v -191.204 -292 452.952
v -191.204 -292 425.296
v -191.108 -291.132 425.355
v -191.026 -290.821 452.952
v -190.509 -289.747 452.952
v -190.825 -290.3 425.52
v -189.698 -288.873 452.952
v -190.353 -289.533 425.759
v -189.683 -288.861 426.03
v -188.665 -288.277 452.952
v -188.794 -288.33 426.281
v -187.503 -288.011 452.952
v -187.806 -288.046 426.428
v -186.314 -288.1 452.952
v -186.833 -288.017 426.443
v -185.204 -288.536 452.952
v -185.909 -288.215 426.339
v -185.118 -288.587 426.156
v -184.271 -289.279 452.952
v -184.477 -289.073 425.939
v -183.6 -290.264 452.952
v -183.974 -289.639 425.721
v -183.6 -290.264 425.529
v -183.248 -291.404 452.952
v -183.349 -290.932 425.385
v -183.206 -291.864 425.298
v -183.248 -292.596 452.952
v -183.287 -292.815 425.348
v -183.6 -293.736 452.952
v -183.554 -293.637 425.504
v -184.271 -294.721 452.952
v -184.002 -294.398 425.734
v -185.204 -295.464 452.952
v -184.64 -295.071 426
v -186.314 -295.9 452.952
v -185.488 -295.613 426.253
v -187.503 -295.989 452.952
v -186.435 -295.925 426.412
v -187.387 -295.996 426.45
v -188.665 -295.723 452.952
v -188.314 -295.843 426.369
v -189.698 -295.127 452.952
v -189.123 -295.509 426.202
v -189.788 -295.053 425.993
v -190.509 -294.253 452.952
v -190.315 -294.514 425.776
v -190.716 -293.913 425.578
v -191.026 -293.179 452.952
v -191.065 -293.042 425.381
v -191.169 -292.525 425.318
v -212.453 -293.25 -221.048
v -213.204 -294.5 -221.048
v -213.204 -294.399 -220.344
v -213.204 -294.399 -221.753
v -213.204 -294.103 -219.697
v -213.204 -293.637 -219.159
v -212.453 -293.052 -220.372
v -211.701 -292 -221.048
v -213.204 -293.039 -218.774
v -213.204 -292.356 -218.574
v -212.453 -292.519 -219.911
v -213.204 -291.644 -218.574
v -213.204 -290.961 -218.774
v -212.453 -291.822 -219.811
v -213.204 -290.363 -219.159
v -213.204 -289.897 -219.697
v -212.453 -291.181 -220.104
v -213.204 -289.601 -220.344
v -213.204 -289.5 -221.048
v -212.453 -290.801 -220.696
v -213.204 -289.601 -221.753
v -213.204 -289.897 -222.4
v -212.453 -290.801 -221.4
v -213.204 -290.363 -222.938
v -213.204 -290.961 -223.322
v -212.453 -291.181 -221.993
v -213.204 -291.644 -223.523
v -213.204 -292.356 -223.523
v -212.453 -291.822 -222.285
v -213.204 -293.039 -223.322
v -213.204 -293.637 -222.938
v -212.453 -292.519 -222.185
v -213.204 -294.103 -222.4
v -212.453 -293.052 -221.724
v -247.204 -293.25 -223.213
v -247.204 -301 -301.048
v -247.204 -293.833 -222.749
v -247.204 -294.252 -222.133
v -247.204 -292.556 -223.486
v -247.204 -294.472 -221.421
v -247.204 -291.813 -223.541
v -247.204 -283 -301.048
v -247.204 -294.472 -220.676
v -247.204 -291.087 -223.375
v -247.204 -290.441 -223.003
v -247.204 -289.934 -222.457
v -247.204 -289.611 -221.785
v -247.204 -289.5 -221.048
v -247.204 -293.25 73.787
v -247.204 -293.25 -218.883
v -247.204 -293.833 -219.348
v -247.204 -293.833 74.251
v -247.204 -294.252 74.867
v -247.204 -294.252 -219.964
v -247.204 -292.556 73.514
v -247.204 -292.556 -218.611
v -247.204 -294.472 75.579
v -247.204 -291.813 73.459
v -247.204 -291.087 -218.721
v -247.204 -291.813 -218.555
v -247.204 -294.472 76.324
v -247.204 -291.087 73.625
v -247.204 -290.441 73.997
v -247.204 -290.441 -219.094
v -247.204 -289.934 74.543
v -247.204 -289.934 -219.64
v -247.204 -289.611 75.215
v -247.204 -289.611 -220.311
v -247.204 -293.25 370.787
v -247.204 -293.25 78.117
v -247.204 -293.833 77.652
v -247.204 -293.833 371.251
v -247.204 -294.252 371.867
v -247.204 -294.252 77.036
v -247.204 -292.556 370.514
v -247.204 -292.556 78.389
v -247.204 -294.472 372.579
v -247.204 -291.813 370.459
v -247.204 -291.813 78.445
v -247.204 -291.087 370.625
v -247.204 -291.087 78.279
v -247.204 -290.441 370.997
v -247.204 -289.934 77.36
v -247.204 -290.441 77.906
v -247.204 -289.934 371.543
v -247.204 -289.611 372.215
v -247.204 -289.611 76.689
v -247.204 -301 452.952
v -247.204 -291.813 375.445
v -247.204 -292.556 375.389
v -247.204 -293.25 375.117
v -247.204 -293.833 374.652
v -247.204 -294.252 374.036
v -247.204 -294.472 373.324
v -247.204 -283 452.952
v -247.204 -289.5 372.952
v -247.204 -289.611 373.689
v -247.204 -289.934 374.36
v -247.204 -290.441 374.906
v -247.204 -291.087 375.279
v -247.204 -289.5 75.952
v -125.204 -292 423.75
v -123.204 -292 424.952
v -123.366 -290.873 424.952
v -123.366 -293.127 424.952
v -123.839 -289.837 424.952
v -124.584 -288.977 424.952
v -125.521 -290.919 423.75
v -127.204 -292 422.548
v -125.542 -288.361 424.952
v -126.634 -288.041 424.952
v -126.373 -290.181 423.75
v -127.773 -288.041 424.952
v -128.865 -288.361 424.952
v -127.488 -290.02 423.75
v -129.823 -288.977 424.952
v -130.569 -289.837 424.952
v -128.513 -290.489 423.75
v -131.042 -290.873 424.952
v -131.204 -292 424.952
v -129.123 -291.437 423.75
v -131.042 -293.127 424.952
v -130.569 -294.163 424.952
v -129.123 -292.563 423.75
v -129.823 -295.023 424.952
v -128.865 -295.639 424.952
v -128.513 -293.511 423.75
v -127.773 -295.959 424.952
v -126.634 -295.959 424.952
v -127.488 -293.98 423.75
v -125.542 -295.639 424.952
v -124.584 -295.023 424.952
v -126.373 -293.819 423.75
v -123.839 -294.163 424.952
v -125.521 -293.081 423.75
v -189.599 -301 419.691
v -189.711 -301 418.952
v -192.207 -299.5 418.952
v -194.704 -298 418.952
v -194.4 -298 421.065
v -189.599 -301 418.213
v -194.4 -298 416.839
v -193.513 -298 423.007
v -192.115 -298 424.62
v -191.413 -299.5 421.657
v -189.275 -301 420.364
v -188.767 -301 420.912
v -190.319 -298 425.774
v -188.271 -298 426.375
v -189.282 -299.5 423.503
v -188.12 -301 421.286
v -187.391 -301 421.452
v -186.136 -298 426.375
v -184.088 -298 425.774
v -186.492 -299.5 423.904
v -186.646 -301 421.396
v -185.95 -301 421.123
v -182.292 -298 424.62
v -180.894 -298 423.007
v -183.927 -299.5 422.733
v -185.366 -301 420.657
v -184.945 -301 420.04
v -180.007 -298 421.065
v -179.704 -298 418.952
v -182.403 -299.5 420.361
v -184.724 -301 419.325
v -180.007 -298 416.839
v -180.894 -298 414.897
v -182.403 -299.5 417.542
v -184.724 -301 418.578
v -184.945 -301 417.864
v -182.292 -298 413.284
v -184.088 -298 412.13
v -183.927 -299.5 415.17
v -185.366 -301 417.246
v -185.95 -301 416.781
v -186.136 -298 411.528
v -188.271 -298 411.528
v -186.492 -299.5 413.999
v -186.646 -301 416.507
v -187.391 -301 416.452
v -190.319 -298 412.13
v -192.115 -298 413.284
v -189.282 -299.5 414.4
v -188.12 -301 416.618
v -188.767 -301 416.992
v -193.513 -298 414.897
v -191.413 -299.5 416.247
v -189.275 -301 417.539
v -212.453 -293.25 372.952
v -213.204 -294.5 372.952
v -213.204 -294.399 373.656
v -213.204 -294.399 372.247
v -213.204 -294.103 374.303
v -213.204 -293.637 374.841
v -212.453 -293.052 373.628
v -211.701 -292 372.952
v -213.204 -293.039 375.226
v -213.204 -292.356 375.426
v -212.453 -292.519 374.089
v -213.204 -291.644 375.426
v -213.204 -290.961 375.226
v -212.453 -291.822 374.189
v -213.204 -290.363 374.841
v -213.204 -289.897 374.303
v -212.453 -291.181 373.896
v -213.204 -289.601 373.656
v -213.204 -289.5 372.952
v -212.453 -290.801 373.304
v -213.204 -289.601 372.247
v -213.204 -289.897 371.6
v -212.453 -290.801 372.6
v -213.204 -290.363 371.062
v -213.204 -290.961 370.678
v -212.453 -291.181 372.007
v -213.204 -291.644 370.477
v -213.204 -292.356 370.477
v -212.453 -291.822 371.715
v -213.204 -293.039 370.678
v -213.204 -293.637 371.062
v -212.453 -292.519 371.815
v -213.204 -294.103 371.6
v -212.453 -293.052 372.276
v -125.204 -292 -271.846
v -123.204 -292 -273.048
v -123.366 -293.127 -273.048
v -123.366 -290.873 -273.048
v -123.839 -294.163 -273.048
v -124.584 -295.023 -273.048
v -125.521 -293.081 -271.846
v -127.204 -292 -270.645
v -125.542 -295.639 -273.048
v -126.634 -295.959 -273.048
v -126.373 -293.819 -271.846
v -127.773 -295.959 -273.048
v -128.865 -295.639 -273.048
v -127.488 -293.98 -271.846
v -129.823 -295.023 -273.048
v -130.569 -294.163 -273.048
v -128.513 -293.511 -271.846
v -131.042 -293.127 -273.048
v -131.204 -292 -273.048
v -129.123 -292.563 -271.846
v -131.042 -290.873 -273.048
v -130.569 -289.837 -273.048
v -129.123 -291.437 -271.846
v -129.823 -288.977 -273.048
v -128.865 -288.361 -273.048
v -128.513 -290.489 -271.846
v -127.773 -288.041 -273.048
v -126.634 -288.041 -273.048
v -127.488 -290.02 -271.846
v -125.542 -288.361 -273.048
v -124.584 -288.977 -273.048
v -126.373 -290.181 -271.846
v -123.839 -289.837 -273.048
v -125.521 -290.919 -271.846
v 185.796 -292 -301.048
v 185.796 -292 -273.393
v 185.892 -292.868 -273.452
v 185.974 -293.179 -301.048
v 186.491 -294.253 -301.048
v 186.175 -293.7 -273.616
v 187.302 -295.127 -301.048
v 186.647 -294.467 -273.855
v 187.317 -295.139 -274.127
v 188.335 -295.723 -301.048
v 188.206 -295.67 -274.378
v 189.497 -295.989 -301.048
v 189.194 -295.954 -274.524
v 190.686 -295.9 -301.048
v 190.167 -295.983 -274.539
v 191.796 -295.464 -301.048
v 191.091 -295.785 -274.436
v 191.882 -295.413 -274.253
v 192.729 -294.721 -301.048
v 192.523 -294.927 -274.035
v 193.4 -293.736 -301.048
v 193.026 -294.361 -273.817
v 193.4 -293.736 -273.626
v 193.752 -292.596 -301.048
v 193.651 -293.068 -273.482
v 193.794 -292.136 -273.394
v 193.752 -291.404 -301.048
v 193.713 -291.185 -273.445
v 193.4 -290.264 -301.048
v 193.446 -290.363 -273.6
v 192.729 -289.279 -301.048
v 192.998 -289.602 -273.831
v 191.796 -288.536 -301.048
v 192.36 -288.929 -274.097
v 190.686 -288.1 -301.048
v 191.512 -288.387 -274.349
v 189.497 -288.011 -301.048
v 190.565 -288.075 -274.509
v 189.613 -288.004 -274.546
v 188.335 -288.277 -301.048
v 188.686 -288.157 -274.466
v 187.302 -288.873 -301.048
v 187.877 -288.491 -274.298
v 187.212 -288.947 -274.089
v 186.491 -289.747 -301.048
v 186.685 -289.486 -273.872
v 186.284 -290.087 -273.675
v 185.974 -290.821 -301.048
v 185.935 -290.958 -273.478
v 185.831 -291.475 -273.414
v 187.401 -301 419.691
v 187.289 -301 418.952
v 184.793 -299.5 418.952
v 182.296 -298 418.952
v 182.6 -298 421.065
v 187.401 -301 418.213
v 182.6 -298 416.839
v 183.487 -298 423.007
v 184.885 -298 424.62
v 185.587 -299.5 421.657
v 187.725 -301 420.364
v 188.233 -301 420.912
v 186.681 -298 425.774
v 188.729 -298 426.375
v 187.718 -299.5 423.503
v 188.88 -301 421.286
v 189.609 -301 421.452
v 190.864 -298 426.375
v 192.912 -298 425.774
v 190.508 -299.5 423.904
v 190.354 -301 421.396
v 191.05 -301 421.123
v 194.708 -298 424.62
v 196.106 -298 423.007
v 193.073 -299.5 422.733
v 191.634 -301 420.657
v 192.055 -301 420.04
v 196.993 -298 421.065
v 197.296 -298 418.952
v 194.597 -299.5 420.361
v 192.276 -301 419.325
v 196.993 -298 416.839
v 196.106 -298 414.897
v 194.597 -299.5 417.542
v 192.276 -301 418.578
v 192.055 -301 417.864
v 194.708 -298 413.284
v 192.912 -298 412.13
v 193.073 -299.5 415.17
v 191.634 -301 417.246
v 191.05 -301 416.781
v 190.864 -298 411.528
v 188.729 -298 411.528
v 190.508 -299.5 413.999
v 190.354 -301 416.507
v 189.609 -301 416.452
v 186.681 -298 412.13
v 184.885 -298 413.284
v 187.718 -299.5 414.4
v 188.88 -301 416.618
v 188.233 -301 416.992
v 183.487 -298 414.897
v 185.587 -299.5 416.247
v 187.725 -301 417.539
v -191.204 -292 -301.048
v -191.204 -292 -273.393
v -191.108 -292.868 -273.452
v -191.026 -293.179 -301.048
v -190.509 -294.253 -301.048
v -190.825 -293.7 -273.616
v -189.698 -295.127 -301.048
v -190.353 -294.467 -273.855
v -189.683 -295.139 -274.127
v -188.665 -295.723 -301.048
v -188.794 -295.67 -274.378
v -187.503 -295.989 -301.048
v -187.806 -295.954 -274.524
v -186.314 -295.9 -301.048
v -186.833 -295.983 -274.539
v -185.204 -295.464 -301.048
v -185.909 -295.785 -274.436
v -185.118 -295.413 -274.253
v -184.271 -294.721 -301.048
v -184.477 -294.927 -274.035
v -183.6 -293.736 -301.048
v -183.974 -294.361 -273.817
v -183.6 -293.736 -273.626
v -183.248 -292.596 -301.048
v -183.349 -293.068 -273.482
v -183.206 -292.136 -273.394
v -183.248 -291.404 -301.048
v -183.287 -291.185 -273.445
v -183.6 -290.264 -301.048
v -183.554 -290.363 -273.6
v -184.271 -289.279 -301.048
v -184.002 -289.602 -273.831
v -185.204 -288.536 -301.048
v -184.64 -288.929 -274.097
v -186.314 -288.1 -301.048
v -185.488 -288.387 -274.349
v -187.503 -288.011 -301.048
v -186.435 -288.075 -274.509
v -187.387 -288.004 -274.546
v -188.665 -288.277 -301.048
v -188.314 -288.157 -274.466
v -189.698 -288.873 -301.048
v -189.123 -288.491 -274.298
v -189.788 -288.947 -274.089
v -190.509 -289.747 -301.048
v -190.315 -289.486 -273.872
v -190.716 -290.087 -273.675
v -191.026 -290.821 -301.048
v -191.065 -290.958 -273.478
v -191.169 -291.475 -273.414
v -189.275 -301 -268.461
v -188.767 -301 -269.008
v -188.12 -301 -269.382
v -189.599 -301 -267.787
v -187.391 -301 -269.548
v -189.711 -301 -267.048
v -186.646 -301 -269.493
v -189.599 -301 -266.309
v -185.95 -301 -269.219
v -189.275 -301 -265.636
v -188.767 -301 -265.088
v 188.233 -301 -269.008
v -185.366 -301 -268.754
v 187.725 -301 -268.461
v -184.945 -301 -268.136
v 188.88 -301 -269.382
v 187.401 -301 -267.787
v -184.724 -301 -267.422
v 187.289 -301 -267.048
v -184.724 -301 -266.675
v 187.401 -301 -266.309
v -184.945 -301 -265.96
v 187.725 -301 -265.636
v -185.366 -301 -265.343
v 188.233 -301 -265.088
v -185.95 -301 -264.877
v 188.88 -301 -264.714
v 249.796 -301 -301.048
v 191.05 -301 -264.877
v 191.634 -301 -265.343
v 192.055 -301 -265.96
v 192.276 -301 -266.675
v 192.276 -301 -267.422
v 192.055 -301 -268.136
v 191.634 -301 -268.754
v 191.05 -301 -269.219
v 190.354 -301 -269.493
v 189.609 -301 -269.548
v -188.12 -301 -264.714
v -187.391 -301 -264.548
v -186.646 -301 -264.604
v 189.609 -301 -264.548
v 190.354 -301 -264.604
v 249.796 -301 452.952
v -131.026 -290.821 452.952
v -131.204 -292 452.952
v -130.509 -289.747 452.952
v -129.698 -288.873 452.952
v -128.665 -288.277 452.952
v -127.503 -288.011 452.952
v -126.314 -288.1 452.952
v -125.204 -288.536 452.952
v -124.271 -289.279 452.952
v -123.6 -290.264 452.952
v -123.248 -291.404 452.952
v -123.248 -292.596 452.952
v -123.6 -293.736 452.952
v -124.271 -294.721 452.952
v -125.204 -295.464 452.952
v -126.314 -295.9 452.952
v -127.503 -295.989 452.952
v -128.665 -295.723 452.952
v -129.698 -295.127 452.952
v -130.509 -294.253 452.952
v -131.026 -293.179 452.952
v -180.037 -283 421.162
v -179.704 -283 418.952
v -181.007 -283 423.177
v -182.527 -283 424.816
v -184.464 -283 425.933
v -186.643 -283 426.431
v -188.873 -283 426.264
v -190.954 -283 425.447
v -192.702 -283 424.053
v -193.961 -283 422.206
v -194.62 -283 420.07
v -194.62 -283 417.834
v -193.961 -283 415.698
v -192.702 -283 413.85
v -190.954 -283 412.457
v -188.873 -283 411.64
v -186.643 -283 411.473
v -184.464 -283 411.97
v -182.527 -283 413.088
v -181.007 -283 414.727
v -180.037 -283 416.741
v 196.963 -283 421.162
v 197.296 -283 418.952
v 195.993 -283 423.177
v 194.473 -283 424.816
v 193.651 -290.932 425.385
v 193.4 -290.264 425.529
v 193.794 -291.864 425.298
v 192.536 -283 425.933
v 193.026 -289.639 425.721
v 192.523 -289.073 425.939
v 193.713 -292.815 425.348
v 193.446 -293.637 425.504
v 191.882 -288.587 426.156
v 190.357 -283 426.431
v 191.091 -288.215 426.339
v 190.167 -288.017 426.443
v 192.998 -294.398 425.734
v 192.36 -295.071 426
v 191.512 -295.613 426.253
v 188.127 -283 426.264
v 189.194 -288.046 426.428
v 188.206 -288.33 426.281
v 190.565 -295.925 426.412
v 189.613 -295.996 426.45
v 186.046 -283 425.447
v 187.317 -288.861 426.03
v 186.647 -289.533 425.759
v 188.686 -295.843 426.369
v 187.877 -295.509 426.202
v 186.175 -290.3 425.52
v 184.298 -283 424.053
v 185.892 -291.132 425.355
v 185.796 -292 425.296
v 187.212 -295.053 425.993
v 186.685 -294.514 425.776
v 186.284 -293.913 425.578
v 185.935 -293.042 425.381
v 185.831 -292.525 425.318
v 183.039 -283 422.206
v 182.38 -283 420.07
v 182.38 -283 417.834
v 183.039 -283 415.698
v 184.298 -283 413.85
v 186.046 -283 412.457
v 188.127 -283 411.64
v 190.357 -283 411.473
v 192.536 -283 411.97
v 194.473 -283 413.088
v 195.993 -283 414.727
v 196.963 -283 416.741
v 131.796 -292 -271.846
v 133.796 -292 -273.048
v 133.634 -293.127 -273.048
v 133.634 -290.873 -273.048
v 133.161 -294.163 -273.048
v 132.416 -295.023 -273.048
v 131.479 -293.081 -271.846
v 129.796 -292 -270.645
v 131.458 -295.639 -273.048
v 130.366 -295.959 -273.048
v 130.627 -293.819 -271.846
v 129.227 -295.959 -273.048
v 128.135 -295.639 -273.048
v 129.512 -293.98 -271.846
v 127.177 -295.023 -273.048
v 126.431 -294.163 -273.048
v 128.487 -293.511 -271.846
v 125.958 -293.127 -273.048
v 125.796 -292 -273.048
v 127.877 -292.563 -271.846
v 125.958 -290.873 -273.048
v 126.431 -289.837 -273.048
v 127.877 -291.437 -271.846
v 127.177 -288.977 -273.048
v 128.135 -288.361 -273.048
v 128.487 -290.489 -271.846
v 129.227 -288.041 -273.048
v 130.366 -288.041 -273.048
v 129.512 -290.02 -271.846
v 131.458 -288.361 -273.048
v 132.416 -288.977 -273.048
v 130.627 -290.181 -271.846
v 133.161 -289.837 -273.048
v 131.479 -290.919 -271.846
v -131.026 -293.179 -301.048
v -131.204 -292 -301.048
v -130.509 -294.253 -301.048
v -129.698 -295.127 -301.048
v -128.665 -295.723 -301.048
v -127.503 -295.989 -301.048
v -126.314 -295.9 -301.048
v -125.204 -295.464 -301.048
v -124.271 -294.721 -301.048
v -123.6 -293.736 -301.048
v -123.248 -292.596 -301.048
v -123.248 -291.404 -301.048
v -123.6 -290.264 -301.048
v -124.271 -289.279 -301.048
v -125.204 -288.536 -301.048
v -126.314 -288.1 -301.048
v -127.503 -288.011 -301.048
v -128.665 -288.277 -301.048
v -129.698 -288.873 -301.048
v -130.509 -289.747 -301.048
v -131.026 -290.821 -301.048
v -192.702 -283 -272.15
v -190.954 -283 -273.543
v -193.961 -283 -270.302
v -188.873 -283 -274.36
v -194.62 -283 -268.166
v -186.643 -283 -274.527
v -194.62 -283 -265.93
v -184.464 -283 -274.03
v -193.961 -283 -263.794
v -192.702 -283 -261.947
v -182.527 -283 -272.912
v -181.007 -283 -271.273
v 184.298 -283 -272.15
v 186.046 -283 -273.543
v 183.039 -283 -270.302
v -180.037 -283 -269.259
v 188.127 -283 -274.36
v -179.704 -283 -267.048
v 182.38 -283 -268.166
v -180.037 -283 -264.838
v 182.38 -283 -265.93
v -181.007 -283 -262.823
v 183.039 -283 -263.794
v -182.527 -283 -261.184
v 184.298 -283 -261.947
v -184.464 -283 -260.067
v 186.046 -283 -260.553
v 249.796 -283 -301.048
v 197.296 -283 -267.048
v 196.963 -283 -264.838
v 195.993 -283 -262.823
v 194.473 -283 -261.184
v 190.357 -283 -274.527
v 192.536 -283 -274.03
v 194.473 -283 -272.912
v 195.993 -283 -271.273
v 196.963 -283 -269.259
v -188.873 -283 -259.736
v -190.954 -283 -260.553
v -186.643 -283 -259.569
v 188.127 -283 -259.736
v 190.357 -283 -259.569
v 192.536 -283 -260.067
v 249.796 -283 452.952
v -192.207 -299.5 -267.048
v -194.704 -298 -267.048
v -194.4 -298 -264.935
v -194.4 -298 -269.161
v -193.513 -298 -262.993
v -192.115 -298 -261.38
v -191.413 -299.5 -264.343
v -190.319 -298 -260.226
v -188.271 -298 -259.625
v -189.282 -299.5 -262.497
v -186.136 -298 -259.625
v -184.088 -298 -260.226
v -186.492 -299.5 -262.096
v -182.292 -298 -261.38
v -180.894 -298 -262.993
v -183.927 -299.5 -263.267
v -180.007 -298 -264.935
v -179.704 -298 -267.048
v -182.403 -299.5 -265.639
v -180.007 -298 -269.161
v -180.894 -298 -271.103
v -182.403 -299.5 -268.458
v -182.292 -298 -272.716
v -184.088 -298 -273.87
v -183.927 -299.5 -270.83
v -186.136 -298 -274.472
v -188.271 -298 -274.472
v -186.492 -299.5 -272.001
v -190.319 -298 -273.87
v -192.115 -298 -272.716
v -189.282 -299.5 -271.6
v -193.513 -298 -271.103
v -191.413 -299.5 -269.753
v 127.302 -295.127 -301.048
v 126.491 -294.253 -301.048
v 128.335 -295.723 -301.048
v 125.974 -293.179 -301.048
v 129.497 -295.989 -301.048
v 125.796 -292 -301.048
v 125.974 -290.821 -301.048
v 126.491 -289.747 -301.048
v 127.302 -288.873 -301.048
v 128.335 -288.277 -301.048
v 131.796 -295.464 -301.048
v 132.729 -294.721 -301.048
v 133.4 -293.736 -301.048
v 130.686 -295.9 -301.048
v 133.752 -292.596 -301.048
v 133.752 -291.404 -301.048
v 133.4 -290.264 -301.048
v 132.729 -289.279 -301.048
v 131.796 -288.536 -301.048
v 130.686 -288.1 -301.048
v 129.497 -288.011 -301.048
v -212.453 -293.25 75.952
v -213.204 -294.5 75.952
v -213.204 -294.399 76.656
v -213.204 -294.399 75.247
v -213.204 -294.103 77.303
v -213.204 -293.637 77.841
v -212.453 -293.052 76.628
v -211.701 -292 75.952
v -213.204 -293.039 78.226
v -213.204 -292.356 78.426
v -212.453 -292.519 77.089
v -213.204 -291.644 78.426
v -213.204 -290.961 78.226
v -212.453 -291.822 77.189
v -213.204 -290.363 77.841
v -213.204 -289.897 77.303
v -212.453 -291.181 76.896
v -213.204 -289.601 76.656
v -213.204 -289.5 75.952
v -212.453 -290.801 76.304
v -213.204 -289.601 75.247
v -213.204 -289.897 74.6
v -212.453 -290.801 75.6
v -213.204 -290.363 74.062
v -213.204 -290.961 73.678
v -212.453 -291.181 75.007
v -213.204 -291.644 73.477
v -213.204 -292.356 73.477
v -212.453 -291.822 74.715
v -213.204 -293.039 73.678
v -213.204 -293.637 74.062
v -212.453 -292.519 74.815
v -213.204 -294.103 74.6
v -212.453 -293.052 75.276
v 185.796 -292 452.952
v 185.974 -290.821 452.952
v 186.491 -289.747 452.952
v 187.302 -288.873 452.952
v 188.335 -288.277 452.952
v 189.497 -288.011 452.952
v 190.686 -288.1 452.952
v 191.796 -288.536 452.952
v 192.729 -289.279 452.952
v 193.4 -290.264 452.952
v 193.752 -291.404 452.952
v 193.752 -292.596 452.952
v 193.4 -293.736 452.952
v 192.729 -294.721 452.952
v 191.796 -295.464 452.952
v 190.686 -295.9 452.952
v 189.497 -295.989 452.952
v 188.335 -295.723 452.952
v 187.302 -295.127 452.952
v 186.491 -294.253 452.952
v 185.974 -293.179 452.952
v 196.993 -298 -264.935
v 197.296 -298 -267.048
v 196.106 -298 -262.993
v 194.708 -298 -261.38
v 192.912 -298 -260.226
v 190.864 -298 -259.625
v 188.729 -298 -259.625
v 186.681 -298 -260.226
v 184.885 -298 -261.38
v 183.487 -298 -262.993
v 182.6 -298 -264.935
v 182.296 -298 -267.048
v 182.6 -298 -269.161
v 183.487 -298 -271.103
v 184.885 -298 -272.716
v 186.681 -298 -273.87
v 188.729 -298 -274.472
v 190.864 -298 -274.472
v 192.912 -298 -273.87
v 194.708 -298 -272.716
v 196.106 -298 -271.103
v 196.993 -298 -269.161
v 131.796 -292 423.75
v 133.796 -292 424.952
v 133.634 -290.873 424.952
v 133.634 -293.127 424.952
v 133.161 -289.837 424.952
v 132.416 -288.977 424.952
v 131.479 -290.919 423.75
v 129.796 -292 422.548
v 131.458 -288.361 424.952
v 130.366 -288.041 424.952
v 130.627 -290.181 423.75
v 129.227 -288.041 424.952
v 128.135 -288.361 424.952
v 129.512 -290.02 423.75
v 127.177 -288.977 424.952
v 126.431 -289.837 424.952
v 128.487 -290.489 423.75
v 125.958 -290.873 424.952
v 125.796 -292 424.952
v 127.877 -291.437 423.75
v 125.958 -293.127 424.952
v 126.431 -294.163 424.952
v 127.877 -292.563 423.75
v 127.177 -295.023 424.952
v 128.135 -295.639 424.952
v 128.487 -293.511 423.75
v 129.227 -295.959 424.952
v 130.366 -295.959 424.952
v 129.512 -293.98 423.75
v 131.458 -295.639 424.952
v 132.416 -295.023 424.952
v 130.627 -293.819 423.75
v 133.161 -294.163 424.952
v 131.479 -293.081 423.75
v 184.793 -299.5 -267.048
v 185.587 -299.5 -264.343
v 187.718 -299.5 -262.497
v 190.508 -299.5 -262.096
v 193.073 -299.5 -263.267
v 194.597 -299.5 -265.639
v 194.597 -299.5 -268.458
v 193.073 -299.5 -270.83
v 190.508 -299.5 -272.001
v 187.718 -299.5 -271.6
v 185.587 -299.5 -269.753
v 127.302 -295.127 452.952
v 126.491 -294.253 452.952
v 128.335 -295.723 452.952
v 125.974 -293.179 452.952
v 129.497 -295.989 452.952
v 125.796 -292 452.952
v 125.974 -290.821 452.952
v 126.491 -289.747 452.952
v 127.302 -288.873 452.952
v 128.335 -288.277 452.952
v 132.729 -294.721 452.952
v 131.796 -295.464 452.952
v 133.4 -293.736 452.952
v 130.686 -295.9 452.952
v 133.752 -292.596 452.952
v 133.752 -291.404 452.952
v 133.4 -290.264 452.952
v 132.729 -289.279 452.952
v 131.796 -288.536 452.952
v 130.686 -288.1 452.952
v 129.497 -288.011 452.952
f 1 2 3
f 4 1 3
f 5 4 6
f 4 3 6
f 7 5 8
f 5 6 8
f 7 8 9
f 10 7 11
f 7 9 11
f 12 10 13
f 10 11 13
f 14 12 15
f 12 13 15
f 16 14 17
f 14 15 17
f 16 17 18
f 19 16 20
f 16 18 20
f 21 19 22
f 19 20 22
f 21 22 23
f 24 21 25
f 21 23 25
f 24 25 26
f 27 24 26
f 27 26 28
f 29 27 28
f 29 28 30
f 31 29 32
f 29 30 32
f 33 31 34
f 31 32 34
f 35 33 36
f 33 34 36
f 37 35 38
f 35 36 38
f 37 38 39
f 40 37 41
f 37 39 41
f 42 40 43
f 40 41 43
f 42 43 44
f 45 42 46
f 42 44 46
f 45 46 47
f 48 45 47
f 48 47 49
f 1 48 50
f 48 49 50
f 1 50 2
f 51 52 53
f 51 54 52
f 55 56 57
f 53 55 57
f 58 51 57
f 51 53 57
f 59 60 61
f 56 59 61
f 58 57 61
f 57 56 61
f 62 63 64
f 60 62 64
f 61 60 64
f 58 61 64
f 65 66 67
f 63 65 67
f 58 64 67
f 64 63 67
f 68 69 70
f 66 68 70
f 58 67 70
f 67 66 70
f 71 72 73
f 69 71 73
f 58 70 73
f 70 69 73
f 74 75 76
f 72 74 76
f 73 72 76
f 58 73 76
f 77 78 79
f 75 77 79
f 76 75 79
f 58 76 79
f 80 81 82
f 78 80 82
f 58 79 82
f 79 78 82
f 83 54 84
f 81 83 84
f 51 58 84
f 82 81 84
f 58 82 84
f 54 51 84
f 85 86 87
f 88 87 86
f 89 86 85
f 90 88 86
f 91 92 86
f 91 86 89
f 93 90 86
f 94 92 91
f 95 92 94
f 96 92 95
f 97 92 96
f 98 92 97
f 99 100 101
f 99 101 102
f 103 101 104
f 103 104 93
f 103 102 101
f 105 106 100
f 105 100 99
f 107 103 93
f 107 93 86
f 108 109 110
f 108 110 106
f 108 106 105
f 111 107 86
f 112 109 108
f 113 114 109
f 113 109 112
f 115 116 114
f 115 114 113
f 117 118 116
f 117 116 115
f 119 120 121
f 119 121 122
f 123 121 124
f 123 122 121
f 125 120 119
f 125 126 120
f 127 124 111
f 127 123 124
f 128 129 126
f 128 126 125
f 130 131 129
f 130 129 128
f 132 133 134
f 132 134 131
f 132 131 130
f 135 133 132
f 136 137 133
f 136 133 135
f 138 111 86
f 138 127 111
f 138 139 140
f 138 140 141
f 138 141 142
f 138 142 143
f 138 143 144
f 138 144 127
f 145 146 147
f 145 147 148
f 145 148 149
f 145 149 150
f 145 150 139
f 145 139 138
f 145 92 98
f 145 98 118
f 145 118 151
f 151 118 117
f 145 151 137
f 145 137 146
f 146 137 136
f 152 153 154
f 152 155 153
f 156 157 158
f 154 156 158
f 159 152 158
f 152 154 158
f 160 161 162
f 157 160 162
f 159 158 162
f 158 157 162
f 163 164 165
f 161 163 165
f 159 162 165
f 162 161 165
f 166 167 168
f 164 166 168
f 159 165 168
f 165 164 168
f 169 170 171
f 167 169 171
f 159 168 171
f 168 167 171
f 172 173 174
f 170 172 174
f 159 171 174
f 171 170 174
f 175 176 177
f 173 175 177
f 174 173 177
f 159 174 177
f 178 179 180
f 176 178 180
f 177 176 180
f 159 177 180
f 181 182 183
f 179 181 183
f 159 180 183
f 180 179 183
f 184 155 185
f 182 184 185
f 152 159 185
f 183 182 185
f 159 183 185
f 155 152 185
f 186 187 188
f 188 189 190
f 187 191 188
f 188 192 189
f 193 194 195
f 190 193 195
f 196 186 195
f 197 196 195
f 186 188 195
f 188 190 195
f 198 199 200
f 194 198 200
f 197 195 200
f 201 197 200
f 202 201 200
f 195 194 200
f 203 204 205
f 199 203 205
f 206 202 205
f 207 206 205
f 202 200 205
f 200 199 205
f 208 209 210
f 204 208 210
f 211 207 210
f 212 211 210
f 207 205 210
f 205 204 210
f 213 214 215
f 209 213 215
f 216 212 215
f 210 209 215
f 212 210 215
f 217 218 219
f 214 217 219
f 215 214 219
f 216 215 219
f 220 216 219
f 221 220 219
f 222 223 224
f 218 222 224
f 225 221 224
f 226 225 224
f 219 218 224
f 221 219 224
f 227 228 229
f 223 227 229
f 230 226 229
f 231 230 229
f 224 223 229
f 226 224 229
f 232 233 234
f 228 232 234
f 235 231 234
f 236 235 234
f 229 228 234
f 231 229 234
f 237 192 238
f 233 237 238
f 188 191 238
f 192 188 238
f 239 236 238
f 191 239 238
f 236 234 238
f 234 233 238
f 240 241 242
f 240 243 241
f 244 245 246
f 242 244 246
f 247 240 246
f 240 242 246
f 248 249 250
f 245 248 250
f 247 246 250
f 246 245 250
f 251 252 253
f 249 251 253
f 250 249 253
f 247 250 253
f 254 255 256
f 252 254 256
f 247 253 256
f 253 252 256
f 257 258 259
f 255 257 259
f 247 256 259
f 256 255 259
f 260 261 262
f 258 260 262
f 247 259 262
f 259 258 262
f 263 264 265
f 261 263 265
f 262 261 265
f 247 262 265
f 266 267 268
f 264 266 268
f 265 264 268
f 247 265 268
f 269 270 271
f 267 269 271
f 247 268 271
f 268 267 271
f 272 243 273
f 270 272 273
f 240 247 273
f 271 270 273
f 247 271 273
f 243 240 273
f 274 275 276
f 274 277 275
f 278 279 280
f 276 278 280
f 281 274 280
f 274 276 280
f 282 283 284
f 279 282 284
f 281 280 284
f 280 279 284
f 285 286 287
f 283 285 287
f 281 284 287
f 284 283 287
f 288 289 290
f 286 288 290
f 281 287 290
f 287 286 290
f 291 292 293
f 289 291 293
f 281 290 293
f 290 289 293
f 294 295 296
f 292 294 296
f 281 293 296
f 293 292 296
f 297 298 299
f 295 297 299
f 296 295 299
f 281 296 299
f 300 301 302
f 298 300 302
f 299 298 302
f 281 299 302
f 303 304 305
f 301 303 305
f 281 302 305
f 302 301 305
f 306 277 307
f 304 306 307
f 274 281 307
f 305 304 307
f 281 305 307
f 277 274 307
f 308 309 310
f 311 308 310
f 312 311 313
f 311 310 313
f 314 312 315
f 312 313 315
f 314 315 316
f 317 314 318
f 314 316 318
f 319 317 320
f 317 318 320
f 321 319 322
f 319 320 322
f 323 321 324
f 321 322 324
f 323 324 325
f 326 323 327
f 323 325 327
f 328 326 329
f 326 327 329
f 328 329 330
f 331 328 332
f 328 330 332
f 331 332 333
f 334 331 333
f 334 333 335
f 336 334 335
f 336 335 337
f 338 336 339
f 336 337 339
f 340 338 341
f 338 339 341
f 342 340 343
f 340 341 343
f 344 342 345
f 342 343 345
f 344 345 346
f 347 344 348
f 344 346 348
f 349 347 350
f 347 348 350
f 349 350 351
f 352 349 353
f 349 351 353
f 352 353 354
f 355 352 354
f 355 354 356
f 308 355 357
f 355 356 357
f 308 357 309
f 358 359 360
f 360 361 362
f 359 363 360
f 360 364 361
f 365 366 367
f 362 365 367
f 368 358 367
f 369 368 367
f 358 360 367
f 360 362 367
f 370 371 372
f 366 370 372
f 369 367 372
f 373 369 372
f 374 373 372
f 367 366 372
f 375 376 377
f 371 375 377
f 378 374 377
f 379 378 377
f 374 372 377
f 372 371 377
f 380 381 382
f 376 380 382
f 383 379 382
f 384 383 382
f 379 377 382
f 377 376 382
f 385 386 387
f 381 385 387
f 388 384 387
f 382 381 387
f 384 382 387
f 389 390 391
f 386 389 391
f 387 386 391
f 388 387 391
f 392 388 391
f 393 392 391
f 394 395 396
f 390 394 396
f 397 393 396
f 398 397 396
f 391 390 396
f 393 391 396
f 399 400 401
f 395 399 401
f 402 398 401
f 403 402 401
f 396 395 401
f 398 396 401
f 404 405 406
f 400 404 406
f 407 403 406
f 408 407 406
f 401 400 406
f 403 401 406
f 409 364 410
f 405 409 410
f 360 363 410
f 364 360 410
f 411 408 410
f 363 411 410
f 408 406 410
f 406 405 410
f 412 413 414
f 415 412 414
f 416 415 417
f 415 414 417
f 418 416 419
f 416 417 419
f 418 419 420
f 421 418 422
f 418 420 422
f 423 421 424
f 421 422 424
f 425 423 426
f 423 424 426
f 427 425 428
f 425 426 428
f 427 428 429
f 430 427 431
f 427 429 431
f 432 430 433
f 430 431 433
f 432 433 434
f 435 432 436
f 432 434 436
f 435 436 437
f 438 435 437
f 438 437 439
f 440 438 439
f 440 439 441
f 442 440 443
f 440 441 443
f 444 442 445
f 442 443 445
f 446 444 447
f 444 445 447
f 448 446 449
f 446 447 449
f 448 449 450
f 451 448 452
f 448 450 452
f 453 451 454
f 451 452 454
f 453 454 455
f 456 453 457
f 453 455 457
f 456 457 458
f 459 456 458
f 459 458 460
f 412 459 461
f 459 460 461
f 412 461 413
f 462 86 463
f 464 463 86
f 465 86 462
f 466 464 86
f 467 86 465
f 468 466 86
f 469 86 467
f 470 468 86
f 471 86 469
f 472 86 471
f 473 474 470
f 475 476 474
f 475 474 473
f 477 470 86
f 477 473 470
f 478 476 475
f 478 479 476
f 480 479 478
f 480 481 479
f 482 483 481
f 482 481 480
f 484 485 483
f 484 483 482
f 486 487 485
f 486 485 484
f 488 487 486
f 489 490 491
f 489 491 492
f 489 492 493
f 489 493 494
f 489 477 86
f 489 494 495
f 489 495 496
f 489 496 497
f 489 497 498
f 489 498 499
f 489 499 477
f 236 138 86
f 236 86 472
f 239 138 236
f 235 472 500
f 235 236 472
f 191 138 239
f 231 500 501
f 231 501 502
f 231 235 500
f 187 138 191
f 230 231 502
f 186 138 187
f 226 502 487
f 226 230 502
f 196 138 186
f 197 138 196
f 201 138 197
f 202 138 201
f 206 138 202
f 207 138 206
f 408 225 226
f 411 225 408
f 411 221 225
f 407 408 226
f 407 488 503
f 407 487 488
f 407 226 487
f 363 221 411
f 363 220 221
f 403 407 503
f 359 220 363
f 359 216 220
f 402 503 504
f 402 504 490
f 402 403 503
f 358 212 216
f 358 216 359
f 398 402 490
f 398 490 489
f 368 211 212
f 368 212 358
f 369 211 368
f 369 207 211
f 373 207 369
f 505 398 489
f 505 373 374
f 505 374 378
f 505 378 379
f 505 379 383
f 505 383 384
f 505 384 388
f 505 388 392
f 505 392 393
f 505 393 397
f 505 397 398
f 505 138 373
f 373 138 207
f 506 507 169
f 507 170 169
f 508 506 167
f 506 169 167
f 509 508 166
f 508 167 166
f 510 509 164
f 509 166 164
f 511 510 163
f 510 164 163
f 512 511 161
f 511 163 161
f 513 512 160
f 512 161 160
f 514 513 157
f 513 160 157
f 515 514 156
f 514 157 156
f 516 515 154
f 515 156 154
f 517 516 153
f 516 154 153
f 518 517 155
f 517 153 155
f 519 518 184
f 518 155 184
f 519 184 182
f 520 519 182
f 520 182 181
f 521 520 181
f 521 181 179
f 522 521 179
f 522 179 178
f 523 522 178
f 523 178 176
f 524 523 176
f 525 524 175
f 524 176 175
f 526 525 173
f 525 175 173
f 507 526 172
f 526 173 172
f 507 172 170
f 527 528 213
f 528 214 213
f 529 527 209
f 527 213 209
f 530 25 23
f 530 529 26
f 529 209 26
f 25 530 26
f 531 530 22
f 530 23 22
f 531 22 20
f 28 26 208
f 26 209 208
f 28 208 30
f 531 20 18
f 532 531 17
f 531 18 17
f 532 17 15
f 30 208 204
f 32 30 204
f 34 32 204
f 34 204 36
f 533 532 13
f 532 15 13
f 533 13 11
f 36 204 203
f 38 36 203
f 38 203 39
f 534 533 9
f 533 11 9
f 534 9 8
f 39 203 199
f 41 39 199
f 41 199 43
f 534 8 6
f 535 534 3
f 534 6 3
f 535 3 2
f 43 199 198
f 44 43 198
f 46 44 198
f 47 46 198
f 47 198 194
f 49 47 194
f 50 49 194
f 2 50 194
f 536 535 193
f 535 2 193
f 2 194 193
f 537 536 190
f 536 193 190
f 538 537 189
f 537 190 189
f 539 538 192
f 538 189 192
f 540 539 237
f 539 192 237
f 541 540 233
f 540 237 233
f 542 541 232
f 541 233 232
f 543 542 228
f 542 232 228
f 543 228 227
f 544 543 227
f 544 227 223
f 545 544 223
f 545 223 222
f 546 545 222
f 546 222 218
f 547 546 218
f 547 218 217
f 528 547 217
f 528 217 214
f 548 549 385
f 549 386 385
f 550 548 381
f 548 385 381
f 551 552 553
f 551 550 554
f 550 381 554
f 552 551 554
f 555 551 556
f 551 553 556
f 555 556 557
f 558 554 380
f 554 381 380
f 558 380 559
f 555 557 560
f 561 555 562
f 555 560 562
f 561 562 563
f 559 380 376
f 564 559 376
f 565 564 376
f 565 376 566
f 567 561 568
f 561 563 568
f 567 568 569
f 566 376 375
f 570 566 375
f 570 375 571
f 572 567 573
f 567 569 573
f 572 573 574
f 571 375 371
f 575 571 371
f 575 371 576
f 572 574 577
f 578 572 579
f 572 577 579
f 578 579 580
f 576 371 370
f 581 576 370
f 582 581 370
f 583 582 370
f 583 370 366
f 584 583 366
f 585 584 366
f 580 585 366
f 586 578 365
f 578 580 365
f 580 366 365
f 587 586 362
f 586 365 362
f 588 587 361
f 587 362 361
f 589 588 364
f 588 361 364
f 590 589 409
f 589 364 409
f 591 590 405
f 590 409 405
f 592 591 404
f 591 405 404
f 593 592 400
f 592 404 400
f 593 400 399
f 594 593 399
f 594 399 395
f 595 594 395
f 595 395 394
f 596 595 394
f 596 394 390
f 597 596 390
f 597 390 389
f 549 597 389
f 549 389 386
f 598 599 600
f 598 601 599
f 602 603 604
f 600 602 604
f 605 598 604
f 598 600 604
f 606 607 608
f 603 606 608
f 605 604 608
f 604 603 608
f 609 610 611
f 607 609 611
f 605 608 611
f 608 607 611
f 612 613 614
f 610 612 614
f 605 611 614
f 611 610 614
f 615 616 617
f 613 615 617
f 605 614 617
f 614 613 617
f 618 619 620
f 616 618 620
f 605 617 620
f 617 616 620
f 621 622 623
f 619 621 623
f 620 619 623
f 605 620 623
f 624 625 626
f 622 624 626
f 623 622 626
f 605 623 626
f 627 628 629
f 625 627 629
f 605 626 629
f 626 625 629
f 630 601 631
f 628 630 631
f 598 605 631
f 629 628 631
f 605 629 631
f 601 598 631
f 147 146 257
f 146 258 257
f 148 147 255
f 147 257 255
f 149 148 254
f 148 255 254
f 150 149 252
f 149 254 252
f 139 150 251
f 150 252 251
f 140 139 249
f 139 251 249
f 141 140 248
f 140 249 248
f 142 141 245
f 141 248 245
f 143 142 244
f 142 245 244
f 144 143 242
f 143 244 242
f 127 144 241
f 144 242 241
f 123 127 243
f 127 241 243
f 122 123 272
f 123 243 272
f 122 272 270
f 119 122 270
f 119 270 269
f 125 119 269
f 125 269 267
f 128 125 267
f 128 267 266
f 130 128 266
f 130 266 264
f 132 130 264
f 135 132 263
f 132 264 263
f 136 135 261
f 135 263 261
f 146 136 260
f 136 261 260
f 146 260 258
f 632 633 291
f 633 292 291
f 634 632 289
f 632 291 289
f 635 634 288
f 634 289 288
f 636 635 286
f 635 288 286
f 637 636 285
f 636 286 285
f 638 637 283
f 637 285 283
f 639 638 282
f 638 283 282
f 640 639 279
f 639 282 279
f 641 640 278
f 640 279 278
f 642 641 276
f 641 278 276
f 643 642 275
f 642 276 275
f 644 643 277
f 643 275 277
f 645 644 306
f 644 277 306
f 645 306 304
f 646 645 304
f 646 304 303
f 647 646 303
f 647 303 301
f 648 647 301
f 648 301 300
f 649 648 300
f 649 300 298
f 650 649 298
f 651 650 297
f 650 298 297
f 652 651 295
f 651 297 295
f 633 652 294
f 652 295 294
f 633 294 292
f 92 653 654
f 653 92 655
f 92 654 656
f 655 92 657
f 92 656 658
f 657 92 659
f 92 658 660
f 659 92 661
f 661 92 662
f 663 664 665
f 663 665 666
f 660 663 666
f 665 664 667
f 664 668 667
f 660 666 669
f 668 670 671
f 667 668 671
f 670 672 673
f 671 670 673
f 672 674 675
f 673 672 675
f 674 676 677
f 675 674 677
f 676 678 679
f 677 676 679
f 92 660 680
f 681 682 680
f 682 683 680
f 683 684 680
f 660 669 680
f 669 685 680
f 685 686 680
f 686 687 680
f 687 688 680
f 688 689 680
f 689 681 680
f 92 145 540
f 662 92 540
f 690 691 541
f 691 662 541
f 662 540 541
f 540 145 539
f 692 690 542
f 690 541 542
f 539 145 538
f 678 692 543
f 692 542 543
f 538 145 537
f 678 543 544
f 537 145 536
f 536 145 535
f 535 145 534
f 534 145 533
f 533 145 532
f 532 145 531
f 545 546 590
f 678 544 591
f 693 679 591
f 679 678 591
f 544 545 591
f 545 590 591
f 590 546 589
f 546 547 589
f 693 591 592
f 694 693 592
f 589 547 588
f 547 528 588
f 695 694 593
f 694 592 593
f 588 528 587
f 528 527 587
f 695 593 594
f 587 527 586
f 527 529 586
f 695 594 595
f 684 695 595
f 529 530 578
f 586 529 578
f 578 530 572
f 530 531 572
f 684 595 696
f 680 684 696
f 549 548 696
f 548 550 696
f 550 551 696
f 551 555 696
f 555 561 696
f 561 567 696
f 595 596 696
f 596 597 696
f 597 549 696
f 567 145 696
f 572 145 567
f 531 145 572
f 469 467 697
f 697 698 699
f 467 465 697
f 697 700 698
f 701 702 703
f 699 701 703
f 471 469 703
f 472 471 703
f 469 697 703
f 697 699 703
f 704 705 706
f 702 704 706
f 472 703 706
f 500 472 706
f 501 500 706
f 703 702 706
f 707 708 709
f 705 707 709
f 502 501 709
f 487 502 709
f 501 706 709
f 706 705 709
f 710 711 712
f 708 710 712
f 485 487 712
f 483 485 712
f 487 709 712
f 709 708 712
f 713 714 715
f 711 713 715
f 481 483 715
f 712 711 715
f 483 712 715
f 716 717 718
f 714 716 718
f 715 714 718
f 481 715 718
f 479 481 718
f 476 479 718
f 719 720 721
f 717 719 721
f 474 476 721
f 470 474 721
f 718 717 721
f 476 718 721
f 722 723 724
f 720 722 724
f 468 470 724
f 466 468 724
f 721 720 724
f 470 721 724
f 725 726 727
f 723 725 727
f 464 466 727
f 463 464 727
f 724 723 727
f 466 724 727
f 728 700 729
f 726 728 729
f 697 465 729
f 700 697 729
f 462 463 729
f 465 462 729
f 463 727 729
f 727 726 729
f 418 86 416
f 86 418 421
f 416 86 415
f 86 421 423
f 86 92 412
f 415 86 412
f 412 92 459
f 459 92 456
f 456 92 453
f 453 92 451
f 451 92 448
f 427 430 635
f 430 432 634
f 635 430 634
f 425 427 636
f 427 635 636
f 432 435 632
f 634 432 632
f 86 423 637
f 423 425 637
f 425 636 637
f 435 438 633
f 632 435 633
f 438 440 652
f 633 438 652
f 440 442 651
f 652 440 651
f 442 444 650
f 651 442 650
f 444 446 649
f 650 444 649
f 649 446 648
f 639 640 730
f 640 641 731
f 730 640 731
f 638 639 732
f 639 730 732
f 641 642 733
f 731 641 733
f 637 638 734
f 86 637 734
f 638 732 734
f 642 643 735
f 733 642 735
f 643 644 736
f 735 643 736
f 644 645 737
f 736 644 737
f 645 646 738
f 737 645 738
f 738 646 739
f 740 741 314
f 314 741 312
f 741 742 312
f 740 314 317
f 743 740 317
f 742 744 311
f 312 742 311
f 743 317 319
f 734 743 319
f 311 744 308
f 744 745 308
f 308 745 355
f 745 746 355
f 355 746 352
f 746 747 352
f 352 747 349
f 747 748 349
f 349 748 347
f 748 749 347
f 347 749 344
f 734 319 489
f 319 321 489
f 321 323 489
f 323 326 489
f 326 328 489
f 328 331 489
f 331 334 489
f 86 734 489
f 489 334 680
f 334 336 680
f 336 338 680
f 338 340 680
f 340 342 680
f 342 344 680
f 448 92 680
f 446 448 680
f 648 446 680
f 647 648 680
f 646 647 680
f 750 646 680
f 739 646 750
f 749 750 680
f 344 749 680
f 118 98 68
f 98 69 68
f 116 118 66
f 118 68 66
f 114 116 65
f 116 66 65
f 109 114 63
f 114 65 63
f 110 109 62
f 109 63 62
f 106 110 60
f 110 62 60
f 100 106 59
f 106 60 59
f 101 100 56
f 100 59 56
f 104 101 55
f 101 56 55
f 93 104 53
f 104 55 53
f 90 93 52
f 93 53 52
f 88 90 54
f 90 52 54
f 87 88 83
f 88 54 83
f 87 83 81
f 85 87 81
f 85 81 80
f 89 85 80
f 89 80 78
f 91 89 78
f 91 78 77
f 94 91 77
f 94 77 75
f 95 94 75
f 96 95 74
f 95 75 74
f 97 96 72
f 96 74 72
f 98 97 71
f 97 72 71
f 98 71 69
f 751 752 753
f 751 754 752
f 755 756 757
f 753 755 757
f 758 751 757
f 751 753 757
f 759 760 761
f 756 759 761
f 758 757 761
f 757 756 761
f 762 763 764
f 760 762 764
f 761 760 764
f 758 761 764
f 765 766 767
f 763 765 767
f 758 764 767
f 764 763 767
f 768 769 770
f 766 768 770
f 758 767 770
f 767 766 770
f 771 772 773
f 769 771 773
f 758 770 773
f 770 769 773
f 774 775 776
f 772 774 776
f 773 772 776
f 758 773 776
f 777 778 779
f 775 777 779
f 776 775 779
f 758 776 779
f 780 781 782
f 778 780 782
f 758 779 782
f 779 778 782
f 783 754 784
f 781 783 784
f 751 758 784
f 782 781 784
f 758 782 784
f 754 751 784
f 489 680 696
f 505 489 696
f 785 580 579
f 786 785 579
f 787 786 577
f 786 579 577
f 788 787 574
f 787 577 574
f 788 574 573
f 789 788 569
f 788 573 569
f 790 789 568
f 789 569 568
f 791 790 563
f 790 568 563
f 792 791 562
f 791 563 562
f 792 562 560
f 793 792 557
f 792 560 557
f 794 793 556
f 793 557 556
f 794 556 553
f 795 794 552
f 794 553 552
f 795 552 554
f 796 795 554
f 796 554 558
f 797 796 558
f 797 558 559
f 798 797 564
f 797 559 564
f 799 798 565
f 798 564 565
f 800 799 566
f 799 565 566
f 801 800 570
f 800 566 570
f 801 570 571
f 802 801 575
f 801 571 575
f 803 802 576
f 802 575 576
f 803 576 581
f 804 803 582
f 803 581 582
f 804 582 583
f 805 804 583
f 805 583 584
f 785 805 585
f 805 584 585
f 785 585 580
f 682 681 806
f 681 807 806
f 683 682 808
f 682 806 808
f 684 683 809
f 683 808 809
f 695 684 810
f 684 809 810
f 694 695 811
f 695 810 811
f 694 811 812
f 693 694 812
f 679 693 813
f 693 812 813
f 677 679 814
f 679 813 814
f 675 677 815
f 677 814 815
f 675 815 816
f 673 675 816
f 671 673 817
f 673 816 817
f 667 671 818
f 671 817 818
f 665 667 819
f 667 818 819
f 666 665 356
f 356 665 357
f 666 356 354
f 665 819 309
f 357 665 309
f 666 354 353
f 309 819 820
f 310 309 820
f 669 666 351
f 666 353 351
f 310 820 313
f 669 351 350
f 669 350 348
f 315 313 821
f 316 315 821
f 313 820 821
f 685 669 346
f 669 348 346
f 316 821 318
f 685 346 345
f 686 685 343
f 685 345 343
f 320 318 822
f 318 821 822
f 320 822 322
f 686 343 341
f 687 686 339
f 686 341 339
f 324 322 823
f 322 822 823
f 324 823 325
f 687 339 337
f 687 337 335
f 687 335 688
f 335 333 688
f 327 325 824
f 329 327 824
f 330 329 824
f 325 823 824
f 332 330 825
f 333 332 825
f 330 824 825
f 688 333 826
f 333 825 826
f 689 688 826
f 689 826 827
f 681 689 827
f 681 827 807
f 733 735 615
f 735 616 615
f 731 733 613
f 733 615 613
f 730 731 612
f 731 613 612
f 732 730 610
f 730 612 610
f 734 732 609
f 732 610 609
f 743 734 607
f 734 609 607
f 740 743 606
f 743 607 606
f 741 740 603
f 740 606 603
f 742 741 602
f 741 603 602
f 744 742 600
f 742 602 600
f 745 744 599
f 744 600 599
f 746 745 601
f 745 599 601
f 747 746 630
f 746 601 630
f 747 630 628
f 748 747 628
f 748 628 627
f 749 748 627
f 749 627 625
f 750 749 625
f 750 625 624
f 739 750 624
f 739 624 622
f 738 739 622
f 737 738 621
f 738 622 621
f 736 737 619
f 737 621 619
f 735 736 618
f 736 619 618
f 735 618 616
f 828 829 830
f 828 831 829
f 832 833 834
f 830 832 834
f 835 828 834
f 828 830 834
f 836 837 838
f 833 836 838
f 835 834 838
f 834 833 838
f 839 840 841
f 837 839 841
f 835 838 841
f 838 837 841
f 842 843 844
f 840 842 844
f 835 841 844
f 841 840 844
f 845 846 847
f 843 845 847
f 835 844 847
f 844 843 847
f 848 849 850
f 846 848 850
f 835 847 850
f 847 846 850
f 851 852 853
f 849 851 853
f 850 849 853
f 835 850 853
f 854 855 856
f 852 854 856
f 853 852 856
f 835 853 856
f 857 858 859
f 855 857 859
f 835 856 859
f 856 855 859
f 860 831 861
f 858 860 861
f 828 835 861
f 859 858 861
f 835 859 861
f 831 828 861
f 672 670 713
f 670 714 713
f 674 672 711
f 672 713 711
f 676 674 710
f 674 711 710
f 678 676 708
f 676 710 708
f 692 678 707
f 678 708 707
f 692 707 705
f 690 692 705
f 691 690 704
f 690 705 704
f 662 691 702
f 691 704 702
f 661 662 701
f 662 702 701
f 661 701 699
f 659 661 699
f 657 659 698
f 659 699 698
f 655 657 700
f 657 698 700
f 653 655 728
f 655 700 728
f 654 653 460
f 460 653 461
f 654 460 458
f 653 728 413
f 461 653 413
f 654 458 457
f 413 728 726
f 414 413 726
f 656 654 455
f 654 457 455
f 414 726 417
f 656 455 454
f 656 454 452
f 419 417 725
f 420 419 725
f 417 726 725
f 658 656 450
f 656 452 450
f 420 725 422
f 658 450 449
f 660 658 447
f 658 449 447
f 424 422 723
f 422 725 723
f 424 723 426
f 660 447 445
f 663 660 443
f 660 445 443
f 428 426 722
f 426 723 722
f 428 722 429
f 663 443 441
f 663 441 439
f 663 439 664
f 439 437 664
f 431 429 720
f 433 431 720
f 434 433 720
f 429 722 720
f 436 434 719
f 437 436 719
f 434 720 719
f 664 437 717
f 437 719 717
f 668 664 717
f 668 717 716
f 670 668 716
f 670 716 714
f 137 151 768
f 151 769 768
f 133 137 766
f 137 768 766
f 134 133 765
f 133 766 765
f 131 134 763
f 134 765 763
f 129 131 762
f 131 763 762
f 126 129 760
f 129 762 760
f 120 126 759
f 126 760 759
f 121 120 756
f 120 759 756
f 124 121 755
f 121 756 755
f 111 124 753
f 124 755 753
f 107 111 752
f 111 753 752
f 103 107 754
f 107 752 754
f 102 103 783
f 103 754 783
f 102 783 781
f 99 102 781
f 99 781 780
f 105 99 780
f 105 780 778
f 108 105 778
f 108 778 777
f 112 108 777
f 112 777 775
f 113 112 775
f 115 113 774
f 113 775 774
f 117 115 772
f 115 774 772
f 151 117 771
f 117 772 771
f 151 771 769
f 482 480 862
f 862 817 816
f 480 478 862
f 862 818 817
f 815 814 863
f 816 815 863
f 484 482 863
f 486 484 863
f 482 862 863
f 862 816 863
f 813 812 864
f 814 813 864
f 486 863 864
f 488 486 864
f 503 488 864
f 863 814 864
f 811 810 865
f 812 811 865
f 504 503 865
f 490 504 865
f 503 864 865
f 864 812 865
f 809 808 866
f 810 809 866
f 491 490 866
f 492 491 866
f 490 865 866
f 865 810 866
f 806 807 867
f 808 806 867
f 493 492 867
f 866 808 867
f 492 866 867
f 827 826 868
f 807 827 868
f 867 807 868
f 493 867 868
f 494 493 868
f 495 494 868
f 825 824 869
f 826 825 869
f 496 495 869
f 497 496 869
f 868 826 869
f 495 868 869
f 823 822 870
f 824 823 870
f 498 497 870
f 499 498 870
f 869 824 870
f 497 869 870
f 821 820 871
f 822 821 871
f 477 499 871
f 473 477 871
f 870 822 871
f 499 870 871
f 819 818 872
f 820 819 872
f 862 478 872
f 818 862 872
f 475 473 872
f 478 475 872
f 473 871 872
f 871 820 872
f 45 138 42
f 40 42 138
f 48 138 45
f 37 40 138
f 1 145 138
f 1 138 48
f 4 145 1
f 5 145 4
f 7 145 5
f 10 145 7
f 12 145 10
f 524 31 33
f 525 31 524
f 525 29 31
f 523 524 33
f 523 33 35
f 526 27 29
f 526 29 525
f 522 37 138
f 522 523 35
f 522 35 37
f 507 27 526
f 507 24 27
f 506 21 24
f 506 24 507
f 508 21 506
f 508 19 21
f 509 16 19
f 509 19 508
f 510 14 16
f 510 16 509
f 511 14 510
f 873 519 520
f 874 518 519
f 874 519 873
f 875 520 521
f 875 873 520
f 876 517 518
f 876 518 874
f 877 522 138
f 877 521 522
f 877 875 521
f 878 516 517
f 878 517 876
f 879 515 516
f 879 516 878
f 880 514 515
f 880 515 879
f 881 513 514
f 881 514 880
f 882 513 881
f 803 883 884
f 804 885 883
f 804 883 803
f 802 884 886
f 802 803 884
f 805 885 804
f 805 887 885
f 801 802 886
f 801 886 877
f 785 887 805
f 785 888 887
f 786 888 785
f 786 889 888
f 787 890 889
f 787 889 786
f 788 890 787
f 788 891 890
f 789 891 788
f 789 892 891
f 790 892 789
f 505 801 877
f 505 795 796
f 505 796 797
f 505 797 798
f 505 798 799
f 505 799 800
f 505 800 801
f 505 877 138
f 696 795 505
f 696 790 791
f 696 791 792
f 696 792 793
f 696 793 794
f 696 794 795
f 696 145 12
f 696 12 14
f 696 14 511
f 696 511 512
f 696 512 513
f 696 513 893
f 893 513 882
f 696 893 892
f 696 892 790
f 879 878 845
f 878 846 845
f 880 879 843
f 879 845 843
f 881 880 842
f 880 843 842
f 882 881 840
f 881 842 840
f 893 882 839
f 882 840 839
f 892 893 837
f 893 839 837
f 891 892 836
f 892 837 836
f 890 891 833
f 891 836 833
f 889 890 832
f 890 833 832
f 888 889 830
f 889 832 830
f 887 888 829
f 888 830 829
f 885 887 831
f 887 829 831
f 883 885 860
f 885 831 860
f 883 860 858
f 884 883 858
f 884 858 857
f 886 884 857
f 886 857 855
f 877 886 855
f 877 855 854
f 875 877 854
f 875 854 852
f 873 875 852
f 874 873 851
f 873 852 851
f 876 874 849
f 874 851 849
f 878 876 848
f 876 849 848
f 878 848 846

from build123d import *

# Parameters (mm, degrees)
F1_W           = 497
F1_H           = 754
F2_DEPTH       = 18
F5_D           = 8
F5_DEPTH       = 28
F5_TIP         = 2.4034424761
F5_ON_F4_D     = 8
F5_ON_F4_DEPTH = 28
F5_ON_F4_TIP   = 2.4034424761
F7_D           = 5
F7_DEPTH       = 34
F7_TIP         = 1.5021515476
F9_D           = 15
F9_DEPTH       = 15
F9_TIP         = 4.5064546427


with BuildPart() as f2:
    # F1 (on offset) → F2 (new body)
    with BuildSketch(Plane.XZ.offset(283)):
        with Locations((1.2963563204, 75.9517796117)):
            Rectangle(F1_W, F1_H)
    extrude(amount=F2_DEPTH)

    # F5
    with Locations(Plane.XY.offset(452.9517796117)):
        with Locations((-187.2036436796, -292), (-127.2036436796, -292), (129.7963563204, -292), (189.7963563204, -292)):
            Hole(F5_D / 2, depth=F5_DEPTH)
            with Locations((0, 0, -(F5_DEPTH + F5_TIP / 2))):  # 118° drill point
                Cone(0, F5_D / 2, F5_TIP, mode=Mode.SUBTRACT)

    # F5 on F4
    with Locations(Plane(origin=(0, 0, -301.0482203883), x_dir=(1, 0, 0), z_dir=(0, 0, -1))):
        with Locations((-187.2036436796, 292), (-127.2036436796, 292), (129.7963563204, 292), (189.7963563204, 292)):
            Hole(F5_ON_F4_D / 2, depth=F5_ON_F4_DEPTH)
            with Locations((0, 0, -(F5_ON_F4_DEPTH + F5_ON_F4_TIP / 2))):  # 118° drill point
                Cone(0, F5_ON_F4_D / 2, F5_ON_F4_TIP, mode=Mode.SUBTRACT)

    # F7
    with Locations(Plane(origin=(-247.2036436796, 0, 0), x_dir=(0, -1, 0), z_dir=(-1, 0, 0))):
        with Locations((292, 372.9517796117), (292, 75.9517796117), (292, -221.0482203883)):
            Hole(F7_D / 2, depth=F7_DEPTH)
            with Locations((0, 0, -(F7_DEPTH + F7_TIP / 2))):  # 118° drill point
                Cone(0, F7_D / 2, F7_TIP, mode=Mode.SUBTRACT)

    # F9
    with Locations(Plane(origin=(0, -283, 0), x_dir=(-1, 0, 0), z_dir=(0, 1, 0))):
        with Locations((-189.7963563204, 418.9517796117), (187.2036436796, 418.9517796117), (187.2036436796, -267.0482203883), (-189.7963563204, -267.0482203883)):
            Hole(F9_D / 2, depth=F9_DEPTH)
            with Locations((0, 0, -(F9_DEPTH + F9_TIP / 2))):  # 118° drill point
                Cone(0, F9_D / 2, F9_TIP, mode=Mode.SUBTRACT)


solid = f2.part
